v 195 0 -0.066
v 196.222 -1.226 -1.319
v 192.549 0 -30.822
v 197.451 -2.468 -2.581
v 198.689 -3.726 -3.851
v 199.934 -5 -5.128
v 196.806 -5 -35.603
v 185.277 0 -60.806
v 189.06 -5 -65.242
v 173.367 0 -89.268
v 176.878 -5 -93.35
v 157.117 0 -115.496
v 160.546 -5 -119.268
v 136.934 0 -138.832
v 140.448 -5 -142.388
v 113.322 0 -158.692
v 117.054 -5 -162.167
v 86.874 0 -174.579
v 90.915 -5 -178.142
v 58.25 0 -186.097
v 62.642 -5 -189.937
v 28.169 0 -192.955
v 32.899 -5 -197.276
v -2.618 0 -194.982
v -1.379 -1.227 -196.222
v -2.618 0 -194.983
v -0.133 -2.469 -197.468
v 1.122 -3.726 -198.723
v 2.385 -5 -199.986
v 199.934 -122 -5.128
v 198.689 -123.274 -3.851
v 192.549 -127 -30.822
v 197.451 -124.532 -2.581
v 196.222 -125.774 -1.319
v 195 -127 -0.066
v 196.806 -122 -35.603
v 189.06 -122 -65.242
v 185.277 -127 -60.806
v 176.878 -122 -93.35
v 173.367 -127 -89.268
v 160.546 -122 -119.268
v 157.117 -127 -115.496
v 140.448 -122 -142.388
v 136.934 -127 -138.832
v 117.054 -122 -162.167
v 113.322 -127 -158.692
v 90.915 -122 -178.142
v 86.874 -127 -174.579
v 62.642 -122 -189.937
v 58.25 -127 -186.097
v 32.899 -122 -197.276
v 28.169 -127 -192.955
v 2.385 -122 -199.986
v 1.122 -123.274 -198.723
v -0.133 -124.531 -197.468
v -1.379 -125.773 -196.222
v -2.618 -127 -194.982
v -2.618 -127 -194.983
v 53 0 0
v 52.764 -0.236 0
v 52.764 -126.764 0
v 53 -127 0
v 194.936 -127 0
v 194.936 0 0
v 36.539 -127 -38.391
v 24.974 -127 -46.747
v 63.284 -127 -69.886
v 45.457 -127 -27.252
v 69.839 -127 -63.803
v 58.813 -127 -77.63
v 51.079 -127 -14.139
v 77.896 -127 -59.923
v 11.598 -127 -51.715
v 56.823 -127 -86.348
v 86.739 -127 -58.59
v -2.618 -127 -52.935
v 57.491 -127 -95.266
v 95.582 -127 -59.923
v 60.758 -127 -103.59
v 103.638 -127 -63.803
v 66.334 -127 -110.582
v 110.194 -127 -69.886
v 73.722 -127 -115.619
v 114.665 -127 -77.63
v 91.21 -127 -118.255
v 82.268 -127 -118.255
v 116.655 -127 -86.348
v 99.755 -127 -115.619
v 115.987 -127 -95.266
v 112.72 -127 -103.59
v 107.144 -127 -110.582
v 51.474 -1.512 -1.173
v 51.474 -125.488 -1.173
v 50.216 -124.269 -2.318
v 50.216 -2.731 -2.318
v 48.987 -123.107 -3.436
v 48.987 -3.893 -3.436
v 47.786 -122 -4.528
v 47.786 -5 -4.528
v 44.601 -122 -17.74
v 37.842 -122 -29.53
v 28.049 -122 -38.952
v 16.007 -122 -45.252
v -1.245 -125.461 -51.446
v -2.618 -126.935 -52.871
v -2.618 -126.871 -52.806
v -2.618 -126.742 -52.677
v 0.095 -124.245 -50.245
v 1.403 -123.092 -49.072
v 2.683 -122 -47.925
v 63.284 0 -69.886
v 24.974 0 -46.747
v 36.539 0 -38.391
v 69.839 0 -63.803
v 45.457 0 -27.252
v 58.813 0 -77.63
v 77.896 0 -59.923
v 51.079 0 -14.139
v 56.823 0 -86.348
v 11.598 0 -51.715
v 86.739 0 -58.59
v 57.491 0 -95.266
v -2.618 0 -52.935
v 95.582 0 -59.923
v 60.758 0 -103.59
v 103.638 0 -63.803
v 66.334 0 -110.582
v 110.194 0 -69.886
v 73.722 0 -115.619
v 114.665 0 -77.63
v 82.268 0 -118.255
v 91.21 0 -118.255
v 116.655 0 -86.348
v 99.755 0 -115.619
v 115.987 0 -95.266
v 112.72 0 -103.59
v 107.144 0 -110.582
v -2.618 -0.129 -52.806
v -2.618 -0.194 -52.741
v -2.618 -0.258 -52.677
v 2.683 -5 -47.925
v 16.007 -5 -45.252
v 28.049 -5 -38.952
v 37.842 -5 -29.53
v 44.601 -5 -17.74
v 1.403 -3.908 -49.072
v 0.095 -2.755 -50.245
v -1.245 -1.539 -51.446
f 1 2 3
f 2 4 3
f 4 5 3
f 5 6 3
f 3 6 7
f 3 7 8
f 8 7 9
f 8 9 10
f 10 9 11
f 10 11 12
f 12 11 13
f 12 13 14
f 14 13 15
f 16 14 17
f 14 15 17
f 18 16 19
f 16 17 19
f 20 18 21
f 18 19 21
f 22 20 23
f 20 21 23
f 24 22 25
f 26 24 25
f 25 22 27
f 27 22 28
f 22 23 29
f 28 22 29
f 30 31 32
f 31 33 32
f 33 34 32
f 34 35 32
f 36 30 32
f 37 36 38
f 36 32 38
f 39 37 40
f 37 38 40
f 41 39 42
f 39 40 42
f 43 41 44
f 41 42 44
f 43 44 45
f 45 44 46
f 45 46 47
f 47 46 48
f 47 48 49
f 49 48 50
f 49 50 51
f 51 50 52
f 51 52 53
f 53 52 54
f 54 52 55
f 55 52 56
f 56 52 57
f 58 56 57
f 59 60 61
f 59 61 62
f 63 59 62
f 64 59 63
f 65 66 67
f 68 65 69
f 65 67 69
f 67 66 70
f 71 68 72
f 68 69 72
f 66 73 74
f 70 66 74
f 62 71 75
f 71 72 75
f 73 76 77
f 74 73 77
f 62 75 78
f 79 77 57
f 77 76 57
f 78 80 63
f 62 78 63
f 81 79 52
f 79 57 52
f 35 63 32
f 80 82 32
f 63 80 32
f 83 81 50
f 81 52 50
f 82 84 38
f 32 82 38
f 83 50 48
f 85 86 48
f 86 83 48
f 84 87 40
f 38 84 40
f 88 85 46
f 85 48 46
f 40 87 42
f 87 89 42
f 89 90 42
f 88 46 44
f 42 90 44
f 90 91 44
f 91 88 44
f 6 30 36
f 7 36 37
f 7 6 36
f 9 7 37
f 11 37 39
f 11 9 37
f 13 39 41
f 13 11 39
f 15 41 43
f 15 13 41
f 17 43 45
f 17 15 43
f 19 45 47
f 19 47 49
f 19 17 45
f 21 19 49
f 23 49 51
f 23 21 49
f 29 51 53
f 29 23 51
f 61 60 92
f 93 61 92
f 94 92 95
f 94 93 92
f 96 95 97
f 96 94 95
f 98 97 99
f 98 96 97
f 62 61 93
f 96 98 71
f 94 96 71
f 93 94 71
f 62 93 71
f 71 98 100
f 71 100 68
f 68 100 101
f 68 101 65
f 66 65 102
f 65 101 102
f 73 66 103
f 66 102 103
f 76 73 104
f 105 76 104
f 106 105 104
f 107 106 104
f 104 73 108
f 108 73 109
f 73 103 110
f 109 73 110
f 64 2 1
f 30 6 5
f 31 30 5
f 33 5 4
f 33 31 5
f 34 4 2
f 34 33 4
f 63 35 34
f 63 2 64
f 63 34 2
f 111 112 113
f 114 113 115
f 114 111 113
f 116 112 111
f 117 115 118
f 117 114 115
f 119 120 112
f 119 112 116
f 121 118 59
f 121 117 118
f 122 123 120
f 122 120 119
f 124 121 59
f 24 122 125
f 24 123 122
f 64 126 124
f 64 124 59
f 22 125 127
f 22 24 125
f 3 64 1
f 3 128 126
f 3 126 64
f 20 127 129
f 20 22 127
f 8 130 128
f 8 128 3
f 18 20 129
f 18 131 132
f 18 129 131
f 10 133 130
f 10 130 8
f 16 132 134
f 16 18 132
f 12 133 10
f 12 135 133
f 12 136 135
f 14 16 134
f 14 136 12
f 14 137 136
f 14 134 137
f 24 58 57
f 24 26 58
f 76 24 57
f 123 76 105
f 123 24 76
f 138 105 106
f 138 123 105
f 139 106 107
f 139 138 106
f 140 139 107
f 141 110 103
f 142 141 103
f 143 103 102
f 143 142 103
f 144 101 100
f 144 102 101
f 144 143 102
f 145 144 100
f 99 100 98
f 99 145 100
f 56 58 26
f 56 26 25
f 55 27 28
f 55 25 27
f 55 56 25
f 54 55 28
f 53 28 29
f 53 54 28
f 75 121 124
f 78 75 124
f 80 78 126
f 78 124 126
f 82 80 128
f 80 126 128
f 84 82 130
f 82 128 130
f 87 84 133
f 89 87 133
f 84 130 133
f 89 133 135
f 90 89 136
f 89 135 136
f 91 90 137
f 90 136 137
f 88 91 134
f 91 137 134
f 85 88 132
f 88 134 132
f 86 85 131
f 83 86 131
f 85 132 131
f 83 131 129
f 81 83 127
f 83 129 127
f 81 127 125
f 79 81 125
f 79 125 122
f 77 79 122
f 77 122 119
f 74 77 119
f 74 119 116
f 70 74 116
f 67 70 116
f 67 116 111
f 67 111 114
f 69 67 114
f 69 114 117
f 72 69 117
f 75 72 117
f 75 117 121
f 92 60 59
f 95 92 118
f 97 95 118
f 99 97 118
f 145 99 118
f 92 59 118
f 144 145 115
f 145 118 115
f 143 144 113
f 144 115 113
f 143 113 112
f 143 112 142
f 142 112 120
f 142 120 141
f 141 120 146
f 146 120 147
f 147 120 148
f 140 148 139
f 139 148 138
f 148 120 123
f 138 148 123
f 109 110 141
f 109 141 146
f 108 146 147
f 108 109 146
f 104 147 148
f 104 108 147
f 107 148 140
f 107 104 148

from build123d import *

# Parameters (mm, degrees)
BOSS_EXTRUDE1_DEPTH = 127
SKETCH2_R           = 30
CUT_EXTRUDE1_DEPTH  = 311.046770665
CHAMFER2_START      = -127
CHAMFER2_DEPTH      = 127


with BuildPart() as part:
    # Sketch1 → Boss-Extrude1 (new body)
    with BuildSketch(Plane(origin=(0, 0, 0), x_dir=(1, 0, 0), z_dir=(0, 1, 0))):
        with BuildLine():
            Line((48, 0), (200, 0))
            ThreePointArc((200, 0), (140.492634639, 142.344018533), (-2.618196121, 199.982861888))
            Line((-2.618196121, 199.982861888), (-2.618196121, 47.92854107))
            ThreePointArc((-2.618196121, 47.92854107), (33.002474045, 34.854507698), (48, 0))
        make_face()
    extrude(amount=-BOSS_EXTRUDE1_DEPTH)

    # Sketch2 → Cut-Extrude1 (cut, through all)
    with BuildSketch(Plane(origin=(0, 0, 0), x_dir=(1, 0, 0), z_dir=(0, 1, 0))):
        with Locations(Location((86.738855642, 88.590303092, 0), (0, 0, 270))):
            Circle(SKETCH2_R)
    extrude(amount=-CUT_EXTRUDE1_DEPTH, mode=Mode.SUBTRACT)

    # Chamfer2: read off the stored shape, not the designer's step
    # Chamfer2 outline → Chamfer2 (cut)
    with BuildSketch(Plane(origin=(0, 0, 0), x_dir=(1, 0, 0), z_dir=(0, 1, 0)).offset(CHAMFER2_START)):
        with BuildLine():
            ThreePointArc((200, 0), (199.983560067, 2.56431335), (199.93424297, 5.128205128))
            Line((199.93424297, 5.128205128), (194.935886896, 0))
            Line((194.935886896, 0), (200, 0))
        make_face()
        with BuildLine():
            Line((-2.618196121, 194.982861888), (2.384724212, 199.98578222))
            ThreePointArc((2.384724212, 199.98578222), (-0.116745086, 199.999965926), (-2.618196121, 199.982861888))
            Line((-2.618196121, 199.982861888), (-2.618196121, 194.982861888))
        make_face()
        with BuildLine():
            Line((48, 0), (52.763623833, 0))
            Line((52.763623833, 0), (47.785923471, 4.528301887))
            ThreePointArc((47.785923471, 4.528301887), (47.946450998, 2.266679661), (48, 0))
        make_face()
        with BuildLine():
            Line((2.682579438, 47.924980621), (-2.618196121, 52.676622021))
            Line((-2.618196121, 52.676622021), (-2.618196121, 47.92854107))
            ThreePointArc((-2.618196121, 47.92854107), (0.032240845, 47.999989172), (2.682579438, 47.924980621))
        make_face()
    extrude(amount=CHAMFER2_DEPTH, mode=Mode.SUBTRACT)

    # Chamfer2 2 outline → Chamfer2 2 (revolve, cut)
    with BuildSketch(Plane.XY):
        Polygon((200, -122), (195, -127), (200, -127), align=None)
        Polygon((48, -127), (53, -127), (48, -122), align=None)
        Polygon((195, 0), (200, -5), (200, 0), align=None)
        Polygon((48, 0), (48, -5), (53, 0), align=None)
    revolve(axis=Axis((0, 0, 0), (0, 1, 0)), mode=Mode.SUBTRACT)


solid = part.part
